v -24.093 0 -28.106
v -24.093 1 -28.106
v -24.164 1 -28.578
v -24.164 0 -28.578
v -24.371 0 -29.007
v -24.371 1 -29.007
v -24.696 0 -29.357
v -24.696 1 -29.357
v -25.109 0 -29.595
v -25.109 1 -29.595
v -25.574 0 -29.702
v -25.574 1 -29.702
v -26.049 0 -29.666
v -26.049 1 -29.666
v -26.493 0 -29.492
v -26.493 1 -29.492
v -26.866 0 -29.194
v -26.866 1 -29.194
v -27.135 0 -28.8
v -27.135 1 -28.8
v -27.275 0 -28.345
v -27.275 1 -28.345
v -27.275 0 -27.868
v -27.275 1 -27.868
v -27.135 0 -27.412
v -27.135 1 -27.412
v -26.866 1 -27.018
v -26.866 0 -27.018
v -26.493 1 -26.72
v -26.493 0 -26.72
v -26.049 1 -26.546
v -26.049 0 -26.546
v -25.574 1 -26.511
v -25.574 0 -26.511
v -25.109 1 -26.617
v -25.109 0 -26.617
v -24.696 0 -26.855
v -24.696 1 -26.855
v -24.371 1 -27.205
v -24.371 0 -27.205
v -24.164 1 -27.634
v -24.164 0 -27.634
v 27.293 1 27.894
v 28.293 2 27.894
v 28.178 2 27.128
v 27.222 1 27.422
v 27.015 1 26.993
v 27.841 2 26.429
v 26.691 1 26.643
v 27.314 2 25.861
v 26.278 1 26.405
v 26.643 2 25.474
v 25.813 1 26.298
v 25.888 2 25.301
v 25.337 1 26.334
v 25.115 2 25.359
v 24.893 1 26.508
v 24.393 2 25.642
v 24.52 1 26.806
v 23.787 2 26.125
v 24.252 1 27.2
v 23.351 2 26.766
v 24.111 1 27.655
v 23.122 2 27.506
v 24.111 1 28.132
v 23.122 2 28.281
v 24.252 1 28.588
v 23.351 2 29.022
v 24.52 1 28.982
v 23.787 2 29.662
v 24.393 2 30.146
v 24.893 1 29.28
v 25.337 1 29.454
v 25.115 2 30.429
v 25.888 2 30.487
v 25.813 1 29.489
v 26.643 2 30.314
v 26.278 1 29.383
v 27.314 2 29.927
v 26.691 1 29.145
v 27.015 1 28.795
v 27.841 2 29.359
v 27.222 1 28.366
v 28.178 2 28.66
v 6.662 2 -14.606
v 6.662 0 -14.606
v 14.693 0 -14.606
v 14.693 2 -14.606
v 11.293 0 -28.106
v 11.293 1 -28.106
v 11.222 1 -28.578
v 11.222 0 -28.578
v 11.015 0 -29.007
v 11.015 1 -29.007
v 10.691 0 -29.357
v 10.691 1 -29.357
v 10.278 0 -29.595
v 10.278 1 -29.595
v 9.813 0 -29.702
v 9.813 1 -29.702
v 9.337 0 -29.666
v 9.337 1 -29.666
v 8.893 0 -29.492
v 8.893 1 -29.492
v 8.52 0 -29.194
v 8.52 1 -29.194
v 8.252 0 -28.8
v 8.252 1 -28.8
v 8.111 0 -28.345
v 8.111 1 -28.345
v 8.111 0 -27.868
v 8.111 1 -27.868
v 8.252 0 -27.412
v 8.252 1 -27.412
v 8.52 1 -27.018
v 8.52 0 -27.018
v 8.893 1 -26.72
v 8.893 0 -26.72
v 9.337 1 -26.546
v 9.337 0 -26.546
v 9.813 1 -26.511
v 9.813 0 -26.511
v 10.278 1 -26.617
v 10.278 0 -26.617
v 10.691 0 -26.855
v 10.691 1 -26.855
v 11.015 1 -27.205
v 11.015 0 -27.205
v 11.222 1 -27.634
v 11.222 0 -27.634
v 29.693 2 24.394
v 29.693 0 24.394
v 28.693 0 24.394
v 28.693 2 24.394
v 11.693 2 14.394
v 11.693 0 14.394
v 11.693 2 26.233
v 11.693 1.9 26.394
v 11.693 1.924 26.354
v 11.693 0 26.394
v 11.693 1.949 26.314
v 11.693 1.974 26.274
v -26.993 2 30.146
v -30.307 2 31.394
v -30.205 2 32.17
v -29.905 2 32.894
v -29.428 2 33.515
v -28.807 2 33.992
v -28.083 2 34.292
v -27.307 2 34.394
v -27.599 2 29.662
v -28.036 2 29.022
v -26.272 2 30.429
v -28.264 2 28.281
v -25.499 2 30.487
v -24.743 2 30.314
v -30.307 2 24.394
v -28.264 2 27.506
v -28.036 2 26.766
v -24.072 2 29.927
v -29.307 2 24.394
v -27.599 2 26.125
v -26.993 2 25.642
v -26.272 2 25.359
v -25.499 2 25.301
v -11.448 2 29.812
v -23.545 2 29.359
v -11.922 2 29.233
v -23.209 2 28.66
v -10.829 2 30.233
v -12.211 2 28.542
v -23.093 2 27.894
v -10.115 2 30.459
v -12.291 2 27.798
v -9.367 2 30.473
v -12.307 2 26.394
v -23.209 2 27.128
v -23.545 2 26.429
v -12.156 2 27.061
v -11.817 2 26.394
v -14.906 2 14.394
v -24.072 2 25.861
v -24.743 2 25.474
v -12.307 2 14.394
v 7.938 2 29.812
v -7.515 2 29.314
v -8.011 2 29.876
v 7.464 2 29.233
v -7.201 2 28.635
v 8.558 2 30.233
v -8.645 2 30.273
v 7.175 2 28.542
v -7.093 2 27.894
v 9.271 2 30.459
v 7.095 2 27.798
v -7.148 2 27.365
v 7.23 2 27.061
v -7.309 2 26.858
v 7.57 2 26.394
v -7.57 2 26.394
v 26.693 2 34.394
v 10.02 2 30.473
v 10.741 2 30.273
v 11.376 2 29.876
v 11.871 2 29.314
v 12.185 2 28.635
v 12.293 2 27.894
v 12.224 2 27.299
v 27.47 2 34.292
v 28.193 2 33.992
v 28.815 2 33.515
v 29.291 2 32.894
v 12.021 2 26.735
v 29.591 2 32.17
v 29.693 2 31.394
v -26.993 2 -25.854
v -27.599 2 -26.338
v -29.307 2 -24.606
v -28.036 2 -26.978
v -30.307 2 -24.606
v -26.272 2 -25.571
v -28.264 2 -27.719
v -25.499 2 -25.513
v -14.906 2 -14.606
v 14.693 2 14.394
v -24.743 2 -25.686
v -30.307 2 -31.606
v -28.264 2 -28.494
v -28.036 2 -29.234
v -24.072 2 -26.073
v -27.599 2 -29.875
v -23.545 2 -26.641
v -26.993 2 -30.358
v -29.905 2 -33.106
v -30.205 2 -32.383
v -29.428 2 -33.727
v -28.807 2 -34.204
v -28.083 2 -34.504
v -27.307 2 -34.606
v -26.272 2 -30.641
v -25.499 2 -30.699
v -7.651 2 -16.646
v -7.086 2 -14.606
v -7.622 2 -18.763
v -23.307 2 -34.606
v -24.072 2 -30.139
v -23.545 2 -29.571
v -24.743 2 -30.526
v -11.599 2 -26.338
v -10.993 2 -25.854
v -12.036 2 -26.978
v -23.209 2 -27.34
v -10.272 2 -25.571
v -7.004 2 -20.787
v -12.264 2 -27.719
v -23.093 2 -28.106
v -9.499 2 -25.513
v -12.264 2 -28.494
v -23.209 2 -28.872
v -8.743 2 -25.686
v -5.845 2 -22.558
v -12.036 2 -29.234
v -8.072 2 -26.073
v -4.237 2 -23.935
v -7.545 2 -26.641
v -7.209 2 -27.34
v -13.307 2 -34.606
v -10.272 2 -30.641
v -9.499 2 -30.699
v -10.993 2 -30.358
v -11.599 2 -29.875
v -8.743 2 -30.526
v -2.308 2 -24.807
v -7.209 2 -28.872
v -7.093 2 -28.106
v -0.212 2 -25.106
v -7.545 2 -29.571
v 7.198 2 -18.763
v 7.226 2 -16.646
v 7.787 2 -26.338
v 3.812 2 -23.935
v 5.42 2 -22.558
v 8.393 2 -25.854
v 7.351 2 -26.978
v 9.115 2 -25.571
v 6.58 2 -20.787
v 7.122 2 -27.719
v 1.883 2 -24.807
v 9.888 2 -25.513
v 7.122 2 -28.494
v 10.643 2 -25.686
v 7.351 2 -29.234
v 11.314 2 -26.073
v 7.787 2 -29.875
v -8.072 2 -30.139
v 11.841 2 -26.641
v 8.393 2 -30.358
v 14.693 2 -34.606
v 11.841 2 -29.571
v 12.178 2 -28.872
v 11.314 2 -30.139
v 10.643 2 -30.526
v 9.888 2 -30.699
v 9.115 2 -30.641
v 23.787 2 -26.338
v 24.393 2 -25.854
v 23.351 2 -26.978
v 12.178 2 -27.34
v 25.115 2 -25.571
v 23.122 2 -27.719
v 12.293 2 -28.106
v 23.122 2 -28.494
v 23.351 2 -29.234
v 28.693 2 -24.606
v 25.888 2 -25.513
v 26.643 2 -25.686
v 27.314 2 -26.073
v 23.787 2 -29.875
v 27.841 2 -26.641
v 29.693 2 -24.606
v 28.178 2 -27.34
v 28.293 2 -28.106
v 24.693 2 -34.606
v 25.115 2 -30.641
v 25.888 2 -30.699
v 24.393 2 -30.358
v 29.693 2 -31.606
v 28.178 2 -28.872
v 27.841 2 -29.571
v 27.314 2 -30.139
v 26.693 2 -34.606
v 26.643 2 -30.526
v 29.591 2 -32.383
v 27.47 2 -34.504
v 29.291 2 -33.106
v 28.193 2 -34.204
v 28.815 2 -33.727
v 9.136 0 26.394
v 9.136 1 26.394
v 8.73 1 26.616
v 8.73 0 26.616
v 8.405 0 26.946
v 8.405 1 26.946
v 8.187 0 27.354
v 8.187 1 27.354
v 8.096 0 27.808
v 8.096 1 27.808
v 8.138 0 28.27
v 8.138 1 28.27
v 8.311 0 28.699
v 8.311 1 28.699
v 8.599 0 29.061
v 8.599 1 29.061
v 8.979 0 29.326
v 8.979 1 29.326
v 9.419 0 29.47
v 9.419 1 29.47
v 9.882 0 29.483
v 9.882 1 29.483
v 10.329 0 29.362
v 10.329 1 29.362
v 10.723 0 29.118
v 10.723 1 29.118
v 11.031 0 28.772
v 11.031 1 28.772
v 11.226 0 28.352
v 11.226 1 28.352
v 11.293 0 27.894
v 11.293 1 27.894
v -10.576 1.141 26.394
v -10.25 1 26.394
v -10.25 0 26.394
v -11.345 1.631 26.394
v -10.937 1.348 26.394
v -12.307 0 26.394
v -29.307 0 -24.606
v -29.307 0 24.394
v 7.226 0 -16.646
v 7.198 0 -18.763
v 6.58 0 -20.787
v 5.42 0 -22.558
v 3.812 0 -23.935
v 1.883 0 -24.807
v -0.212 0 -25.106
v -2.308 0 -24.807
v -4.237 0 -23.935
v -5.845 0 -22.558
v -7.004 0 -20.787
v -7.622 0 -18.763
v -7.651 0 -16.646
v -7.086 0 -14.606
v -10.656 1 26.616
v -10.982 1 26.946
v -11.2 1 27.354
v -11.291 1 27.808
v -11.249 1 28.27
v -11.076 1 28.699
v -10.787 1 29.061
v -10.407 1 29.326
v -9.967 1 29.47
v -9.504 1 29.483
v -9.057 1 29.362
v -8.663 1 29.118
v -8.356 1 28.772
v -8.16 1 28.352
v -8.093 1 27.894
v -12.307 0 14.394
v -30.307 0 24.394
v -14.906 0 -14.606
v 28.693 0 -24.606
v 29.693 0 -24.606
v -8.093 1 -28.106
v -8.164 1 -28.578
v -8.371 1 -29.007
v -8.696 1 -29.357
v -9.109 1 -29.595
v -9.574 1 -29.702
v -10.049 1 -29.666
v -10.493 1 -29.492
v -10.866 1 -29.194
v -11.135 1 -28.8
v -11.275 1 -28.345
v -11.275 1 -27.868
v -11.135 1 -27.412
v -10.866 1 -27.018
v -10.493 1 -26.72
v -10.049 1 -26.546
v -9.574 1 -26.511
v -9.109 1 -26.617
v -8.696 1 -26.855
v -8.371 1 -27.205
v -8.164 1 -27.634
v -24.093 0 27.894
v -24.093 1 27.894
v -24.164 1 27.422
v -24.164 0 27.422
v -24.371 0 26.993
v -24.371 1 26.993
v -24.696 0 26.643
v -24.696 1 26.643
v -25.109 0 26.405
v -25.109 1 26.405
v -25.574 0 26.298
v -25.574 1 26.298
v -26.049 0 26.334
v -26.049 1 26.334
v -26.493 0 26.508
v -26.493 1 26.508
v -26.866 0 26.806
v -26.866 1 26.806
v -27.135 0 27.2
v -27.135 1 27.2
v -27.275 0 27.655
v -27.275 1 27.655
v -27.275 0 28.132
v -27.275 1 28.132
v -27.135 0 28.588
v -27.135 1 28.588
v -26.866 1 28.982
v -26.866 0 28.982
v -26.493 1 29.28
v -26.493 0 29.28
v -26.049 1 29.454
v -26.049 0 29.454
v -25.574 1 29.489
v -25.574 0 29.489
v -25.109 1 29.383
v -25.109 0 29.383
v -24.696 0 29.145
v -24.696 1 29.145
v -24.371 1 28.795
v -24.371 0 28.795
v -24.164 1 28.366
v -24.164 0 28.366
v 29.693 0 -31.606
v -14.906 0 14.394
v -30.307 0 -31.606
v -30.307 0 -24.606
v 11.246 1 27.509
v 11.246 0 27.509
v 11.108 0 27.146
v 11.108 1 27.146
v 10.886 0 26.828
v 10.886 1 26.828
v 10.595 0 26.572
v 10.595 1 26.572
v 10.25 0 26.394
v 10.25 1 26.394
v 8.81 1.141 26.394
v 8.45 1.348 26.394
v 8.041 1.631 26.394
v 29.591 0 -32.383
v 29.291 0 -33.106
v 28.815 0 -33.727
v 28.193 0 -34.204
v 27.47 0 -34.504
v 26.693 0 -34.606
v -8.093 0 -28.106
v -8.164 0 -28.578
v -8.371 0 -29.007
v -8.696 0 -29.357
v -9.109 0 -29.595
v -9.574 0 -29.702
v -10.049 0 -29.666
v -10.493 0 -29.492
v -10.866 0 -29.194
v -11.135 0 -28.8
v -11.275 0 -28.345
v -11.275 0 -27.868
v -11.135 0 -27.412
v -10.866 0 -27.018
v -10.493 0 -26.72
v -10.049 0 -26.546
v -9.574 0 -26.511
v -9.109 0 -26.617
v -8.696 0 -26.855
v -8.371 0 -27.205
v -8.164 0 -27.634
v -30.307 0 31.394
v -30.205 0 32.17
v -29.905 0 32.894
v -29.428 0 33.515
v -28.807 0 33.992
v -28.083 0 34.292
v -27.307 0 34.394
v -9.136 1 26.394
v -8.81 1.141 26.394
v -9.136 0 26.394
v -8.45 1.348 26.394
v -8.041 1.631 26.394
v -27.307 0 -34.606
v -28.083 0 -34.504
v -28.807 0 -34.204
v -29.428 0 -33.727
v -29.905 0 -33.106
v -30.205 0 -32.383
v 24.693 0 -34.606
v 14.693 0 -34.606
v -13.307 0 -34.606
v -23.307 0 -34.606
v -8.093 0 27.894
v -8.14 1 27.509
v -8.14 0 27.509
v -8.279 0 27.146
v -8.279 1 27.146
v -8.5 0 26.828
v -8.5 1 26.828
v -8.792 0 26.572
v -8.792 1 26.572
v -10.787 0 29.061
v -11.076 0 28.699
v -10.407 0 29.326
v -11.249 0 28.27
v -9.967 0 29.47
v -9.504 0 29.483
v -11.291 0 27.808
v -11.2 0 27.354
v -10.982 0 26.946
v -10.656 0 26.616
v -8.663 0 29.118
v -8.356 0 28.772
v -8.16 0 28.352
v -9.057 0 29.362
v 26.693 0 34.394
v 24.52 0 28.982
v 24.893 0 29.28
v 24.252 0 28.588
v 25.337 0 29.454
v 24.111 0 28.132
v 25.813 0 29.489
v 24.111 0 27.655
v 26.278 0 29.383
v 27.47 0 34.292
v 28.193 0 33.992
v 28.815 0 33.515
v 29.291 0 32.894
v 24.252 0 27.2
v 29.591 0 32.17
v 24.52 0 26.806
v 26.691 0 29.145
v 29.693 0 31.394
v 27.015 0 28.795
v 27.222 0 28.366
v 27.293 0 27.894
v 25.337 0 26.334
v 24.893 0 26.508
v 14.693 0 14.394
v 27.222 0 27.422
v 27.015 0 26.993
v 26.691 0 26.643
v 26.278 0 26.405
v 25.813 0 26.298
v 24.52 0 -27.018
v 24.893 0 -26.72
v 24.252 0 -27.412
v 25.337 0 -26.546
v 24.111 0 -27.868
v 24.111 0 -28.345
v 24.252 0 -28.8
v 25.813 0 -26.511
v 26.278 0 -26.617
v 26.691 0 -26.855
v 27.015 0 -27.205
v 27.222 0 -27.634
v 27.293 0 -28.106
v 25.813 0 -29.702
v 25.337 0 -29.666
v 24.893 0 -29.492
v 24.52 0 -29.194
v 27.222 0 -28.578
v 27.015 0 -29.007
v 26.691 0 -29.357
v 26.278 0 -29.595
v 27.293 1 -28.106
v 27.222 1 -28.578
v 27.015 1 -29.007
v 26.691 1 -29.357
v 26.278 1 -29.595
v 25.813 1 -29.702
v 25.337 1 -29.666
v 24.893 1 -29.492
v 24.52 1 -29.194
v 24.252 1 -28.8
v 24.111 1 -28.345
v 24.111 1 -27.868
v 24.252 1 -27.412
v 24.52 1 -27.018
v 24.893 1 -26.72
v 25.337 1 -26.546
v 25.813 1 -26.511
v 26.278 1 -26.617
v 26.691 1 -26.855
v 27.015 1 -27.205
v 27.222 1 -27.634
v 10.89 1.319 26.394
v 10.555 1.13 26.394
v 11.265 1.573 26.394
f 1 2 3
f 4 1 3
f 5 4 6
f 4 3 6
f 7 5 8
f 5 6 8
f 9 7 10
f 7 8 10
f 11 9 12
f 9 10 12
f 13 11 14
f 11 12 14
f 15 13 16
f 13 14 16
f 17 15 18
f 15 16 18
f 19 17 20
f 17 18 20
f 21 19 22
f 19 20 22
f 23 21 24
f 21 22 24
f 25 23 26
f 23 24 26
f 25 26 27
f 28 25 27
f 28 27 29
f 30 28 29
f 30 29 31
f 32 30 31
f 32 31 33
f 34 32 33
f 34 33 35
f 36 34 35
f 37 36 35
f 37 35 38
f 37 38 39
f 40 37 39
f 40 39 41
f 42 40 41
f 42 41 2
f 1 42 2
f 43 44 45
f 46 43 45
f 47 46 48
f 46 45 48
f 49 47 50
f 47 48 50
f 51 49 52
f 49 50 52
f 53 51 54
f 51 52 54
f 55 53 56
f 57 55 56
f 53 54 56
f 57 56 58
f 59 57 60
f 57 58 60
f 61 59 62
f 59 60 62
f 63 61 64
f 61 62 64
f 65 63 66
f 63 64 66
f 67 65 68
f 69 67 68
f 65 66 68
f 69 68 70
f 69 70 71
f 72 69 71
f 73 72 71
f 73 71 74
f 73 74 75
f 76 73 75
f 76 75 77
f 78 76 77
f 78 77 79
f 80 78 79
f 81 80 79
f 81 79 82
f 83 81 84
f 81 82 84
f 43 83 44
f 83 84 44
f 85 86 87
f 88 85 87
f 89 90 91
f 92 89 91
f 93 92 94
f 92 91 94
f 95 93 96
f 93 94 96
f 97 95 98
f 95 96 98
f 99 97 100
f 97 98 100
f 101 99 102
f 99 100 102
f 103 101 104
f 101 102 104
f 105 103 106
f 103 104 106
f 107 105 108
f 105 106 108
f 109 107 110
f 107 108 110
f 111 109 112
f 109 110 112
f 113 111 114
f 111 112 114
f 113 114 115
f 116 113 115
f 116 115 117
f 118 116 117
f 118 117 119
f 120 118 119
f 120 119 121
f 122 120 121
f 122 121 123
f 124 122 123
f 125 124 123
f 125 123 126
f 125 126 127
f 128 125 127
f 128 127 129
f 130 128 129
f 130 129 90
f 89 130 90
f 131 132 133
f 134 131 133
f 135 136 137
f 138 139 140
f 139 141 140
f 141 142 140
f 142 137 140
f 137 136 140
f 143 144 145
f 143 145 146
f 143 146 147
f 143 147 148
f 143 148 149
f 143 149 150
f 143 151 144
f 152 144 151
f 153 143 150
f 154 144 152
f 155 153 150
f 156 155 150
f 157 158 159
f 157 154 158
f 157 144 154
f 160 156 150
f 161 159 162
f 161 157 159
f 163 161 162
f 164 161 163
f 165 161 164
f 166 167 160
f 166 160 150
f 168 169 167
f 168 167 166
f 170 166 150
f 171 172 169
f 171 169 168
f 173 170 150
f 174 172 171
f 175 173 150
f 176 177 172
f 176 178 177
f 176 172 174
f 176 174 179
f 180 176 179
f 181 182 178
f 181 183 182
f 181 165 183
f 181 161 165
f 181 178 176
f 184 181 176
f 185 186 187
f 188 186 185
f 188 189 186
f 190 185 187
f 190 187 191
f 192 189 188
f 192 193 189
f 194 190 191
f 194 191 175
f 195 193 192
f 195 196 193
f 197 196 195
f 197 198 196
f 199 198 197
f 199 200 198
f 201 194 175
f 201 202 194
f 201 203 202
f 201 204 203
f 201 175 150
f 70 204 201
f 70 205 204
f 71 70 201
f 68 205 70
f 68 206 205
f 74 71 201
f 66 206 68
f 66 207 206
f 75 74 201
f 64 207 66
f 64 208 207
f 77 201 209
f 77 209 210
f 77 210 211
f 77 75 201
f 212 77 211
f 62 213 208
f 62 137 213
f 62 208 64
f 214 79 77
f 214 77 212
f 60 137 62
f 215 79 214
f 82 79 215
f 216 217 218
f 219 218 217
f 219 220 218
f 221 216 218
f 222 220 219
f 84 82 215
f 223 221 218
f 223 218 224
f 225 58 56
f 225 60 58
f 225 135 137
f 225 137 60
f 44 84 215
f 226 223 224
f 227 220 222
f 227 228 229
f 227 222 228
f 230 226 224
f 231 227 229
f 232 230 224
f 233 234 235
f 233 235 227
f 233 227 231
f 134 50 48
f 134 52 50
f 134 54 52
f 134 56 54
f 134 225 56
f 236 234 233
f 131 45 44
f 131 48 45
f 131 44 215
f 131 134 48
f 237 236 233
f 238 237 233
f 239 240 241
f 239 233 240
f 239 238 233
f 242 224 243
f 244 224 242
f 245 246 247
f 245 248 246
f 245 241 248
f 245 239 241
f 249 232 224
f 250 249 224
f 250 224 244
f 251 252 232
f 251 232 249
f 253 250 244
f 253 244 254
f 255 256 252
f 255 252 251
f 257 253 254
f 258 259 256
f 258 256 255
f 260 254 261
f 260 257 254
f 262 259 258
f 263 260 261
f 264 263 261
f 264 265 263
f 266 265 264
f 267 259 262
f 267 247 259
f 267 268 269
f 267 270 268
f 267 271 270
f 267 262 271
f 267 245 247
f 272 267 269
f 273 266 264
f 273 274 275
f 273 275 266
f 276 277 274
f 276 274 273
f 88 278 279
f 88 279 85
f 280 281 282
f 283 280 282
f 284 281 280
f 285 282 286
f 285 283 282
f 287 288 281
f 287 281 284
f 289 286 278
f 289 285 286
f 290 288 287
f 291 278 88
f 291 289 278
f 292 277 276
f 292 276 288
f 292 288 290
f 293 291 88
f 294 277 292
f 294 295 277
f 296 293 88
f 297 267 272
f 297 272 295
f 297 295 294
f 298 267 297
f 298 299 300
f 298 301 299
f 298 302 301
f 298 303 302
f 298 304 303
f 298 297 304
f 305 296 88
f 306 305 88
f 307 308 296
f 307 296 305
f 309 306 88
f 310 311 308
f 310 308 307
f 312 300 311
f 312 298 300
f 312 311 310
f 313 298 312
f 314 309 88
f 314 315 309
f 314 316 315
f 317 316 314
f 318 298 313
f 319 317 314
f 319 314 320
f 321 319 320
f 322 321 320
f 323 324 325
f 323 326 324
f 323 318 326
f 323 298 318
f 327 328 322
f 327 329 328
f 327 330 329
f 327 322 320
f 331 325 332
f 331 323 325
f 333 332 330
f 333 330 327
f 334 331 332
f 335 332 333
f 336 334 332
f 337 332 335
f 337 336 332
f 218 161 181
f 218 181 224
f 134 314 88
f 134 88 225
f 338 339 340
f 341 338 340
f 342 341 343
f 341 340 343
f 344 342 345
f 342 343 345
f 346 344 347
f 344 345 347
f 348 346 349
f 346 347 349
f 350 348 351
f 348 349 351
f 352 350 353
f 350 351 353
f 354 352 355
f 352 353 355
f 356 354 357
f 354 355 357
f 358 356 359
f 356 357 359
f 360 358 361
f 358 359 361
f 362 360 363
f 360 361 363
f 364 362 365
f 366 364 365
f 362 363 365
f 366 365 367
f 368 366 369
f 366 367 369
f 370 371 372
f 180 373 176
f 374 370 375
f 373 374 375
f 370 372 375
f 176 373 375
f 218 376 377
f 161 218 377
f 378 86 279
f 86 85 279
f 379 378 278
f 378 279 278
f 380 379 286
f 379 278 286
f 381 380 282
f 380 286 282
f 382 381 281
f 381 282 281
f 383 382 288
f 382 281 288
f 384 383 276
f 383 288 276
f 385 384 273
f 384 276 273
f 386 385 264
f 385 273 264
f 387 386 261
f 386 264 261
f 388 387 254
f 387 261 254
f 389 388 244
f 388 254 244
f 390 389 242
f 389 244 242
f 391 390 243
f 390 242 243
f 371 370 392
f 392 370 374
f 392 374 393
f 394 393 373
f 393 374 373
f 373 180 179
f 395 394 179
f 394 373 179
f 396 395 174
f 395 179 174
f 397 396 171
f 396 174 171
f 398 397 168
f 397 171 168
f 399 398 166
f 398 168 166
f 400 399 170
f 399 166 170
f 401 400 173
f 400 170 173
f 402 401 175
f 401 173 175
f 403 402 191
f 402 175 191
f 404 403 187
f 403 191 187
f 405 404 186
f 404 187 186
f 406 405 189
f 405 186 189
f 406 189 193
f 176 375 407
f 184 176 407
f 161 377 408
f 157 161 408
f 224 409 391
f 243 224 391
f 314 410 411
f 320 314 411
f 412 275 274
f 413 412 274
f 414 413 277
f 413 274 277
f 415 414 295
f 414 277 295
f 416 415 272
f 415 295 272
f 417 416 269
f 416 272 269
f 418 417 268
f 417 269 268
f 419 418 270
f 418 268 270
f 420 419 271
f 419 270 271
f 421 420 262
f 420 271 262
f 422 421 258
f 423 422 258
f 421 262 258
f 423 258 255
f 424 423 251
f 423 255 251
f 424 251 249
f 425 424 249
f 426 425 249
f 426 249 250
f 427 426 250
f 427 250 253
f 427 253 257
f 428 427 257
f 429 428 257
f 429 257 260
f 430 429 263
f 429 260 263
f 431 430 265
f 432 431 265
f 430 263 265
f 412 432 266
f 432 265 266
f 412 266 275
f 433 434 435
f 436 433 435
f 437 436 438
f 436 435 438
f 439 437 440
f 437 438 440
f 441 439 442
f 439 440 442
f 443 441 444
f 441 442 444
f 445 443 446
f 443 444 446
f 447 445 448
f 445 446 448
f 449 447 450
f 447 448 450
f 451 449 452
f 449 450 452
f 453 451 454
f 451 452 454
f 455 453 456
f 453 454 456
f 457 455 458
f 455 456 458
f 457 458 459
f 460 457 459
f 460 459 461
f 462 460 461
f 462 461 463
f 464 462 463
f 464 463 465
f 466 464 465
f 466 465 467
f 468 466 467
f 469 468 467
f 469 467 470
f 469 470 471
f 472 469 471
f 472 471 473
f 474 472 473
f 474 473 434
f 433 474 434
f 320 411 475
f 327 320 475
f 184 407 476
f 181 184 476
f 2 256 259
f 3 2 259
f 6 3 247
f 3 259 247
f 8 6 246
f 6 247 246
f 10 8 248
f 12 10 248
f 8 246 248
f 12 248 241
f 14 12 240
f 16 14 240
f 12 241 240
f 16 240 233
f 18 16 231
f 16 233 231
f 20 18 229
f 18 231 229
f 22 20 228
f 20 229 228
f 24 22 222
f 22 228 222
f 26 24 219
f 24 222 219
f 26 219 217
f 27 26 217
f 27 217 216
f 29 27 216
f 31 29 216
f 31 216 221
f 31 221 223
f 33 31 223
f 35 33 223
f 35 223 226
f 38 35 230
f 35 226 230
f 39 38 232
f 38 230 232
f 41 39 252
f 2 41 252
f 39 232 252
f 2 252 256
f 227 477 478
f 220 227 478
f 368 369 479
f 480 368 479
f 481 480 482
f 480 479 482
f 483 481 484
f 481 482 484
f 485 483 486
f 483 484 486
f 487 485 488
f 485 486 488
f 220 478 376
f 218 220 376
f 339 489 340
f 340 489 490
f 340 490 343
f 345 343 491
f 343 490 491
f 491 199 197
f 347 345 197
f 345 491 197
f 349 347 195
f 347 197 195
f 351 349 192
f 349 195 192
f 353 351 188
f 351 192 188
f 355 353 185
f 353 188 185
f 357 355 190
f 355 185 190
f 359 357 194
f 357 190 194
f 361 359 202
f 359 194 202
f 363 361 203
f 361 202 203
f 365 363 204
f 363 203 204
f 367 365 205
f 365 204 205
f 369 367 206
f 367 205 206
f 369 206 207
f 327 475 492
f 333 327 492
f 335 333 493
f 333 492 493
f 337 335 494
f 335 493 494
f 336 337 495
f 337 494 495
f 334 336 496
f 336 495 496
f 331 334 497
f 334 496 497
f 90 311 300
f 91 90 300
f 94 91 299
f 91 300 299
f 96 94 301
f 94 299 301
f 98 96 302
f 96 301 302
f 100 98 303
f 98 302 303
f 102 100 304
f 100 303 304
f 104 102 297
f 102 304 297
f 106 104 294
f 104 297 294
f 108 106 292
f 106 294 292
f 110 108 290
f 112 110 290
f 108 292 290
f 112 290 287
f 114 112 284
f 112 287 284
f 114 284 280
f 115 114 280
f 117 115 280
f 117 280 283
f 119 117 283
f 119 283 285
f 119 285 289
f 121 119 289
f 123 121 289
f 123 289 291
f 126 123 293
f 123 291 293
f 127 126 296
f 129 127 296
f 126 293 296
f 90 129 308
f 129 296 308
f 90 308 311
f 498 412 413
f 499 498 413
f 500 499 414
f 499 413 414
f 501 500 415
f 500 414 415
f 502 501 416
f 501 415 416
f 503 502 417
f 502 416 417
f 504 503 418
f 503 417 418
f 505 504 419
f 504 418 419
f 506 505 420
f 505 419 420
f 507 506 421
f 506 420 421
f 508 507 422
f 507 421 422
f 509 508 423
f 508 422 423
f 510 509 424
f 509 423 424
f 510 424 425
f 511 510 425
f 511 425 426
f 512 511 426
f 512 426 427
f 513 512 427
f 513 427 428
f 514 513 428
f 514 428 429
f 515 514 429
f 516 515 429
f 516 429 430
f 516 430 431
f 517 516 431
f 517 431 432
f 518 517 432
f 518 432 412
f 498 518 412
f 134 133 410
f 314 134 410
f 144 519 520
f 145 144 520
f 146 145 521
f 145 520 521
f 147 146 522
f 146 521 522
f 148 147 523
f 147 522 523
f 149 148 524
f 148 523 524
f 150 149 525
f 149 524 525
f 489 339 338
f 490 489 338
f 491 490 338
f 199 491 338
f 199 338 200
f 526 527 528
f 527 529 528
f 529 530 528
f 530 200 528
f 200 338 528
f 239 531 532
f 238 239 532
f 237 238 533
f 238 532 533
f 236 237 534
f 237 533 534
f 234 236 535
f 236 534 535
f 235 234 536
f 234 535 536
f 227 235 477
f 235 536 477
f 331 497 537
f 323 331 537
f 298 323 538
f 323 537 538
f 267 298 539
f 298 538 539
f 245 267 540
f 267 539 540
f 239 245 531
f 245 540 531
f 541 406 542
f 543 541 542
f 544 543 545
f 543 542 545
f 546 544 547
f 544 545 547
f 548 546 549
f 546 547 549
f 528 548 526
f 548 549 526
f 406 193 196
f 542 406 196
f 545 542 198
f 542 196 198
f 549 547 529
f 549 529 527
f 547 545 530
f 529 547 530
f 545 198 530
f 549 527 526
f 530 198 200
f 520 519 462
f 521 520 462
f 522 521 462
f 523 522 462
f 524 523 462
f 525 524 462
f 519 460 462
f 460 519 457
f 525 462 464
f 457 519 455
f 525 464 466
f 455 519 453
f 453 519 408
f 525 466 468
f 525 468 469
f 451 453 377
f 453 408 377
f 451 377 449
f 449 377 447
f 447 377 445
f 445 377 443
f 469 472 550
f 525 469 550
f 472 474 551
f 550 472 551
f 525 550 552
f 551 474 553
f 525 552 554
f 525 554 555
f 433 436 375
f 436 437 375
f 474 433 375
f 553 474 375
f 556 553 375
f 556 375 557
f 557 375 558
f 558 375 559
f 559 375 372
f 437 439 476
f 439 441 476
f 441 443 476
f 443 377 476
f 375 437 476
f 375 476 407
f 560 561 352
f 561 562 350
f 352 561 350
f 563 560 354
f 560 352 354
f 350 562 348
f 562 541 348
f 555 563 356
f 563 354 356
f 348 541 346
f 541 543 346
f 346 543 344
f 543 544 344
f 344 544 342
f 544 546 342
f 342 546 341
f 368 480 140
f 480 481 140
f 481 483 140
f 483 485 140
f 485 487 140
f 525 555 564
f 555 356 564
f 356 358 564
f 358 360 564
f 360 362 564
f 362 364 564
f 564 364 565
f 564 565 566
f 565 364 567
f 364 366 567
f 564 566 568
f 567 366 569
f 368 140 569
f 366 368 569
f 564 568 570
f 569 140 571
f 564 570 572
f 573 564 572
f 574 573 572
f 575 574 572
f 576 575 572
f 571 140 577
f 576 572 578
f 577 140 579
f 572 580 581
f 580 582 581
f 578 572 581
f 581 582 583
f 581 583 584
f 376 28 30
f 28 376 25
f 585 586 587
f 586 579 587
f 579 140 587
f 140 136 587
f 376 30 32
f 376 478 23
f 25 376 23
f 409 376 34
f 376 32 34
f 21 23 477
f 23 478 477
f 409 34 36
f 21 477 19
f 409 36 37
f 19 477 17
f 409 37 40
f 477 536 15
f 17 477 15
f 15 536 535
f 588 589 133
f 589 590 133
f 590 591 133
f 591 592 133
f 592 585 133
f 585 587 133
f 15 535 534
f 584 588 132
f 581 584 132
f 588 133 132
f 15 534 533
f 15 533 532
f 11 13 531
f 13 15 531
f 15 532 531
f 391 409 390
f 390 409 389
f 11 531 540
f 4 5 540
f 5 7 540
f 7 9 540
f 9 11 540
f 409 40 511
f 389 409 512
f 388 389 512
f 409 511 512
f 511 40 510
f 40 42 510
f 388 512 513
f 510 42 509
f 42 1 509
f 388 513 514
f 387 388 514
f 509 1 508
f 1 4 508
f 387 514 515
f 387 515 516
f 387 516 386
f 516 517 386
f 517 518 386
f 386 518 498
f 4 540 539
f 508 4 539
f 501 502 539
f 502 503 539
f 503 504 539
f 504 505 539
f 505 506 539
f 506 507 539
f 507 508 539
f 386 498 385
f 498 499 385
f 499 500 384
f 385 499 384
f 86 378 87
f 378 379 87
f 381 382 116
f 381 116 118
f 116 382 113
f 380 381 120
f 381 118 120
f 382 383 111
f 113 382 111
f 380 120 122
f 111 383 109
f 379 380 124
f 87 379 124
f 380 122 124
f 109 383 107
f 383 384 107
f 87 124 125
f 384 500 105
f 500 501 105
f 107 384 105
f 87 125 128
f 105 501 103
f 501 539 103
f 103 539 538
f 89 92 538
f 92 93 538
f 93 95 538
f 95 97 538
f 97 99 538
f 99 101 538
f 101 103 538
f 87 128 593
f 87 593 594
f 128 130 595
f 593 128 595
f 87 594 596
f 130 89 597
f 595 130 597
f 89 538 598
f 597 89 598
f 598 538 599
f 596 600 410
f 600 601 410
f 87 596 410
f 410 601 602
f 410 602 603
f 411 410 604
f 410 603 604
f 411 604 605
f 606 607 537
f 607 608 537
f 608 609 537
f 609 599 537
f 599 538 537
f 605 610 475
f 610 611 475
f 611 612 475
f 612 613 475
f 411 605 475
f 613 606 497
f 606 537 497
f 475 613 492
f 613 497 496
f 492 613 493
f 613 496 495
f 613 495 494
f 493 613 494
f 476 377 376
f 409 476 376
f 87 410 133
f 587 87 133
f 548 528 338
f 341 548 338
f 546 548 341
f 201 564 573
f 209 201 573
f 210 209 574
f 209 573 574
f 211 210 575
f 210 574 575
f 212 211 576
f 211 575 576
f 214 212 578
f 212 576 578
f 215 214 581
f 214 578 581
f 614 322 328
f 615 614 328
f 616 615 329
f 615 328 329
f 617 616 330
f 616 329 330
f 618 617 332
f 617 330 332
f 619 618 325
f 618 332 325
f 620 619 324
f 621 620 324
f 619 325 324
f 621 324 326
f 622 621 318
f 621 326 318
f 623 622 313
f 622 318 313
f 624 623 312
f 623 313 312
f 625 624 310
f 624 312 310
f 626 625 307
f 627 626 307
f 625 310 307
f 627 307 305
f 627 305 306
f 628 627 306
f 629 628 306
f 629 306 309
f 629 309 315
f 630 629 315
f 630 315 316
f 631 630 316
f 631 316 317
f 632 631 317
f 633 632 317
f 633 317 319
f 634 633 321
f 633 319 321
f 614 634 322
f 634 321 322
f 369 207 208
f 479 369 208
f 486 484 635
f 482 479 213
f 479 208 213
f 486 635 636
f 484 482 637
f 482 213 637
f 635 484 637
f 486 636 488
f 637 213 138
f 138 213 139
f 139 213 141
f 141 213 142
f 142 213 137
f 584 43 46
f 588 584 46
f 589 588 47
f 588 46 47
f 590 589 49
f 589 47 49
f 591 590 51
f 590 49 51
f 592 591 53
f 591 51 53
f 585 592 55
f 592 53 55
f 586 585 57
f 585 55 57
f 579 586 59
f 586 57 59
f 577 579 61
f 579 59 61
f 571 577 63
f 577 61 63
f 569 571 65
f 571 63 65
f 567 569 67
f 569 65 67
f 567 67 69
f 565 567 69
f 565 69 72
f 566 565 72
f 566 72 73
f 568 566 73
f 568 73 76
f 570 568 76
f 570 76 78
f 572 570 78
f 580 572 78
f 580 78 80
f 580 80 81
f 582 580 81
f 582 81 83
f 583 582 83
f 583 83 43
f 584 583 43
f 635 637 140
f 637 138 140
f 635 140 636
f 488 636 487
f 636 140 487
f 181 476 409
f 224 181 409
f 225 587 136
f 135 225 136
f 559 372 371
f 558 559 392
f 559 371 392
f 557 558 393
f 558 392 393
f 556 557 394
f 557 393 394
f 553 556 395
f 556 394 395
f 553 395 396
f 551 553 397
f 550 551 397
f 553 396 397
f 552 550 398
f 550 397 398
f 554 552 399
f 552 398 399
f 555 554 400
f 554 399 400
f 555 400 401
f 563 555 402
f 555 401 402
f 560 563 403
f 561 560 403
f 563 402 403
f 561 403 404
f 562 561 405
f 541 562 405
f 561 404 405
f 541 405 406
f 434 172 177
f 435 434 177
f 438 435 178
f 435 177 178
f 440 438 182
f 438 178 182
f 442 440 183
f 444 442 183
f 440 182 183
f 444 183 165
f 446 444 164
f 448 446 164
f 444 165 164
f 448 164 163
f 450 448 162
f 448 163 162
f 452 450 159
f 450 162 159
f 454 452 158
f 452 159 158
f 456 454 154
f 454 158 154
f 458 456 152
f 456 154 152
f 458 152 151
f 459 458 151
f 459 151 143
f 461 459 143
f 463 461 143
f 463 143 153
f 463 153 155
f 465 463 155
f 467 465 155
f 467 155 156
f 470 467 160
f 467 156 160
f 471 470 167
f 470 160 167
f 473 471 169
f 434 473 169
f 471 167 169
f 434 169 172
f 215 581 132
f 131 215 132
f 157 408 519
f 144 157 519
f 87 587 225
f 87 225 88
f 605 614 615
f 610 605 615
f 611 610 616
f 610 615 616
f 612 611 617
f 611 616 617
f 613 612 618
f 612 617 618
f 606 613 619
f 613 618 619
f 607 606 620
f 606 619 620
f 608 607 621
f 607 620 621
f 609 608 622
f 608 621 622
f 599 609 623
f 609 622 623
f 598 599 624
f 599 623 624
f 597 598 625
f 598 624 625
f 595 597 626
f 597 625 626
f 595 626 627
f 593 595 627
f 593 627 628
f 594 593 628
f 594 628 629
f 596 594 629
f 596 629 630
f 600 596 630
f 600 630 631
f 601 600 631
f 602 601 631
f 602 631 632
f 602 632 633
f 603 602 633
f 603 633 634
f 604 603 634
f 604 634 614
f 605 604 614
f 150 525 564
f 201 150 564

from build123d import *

# Parameters (mm, degrees)
SKETCH1_W           = 14.40065461
SKETCH1_H           = 29
SKETCH1_W_2         = 14
SKETCH1_R           = 1.35
BOSS_EXTRUDE2_DEPTH = 2
SKETCH2_R           = 7.5
CUT_EXTRUDE1_DEPTH  = 2
SKETCH3_W           = 5.497638463
SKETCH3_H           = 5.570940309
SKETCH3_W_2         = 9.162730771
SKETCH3_H_2         = 3.811696001
SKETCH3_W_3         = 6.450562463
SKETCH3_H_3         = 6.157355078
SKETCH3_W_4         = 5.570940309
SKETCH3_H_4         = 4.544714463
SKETCH3_W_5         = 6.27821864
SKETCH3_H_5         = 3.656250045
SKETCH3_W_6         = 6.338006476
SKETCH3_H_6         = 4.174139377
BOSS_EXTRUDE3_DEPTH = 2
SKETCH4_R           = 1.6
CUT_EXTRUDE2_DEPTH  = 10
CHAMFER1_SIZE       = 1
SKETCH5_W           = 10.813263603
SKETCH5_H           = 2.270321327
SKETCH5_W_2         = 10.386812418
SKETCH5_H_2         = 2.583327919
SKETCH5_W_3         = 10.884553744
SKETCH5_H_3         = 2.62287776
SKETCH5_W_4         = 12.051602383
SKETCH5_H_4         = 3.322696714
BOSS_EXTRUDE4_DEPTH = 2


with BuildPart() as part:
    # Sketch1 → Boss-Extrude2 (new body)
    with BuildSketch(Plane(origin=(0, 0, 0), x_dir=(1, 0, 0), z_dir=(0, 1, 0))):
        with Locations((-22.106428168, 0.106069008)):
            Rectangle(SKETCH1_W, SKETCH1_H)
        with Locations((21.693244527, 0.106069008)):
            Rectangle(SKETCH1_W_2, SKETCH1_H)
        with BuildLine():
            Line((22.693244527, -34.393930992), (26.693244527, -34.393930992))
            ThreePointArc((26.693244527, -34.393930992), (28.814564871, -33.515251336), (29.693244527, -31.393930992))
            Line((29.693244527, -31.393930992), (29.693244527, -24.393930992))
            Line((29.693244527, -24.393930992), (28.693244527, -24.393930992))
            Line((28.693244527, -24.393930992), (28.693244527, -14.393930992))
            Line((28.693244527, -14.393930992), (11.693244527, -14.393930992))
            Line((11.693244527, -14.393930992), (11.693244527, -26.393930992))
            Line((11.693244527, -26.393930992), (-12.306755473, -26.393930992))
            Line((-12.306755473, -26.393930992), (-12.306755473, -14.393930992))
            Line((-12.306755473, -14.393930992), (-29.306755473, -14.393930992))
            Line((-29.306755473, -14.393930992), (-29.306755473, -24.393930992))
            Line((-29.306755473, -24.393930992), (-30.306755473, -24.393930992))
            Line((-30.306755473, -24.393930992), (-30.306755473, -31.393930992))
            ThreePointArc((-30.306755473, -31.393930992), (-29.428075817, -33.515251336), (-27.306755473, -34.393930992))
            Line((-27.306755473, -34.393930992), (-25.306755473, -34.393930992))
            Line((-25.306755473, -34.393930992), (-25.306755473, -32.393930992))
            Line((-25.306755473, -32.393930992), (-15.306755473, -32.393930992))
            Line((-15.306755473, -32.393930992), (-15.306755473, -34.393930992))
            Line((-15.306755473, -34.393930992), (12.693244527, -34.393930992))
            Line((12.693244527, -34.393930992), (12.693244527, -32.393930992))
            Line((12.693244527, -32.393930992), (22.693244527, -32.393930992))
            Line((22.693244527, -32.393930992), (22.693244527, -34.393930992))
        make_face()
        with Locations((-20.98250428, -22.393930992)):
            Circle(SKETCH1_R, mode=Mode.SUBTRACT)
        with Locations((19.975772563, -22.393930992)):
            Circle(SKETCH1_R, mode=Mode.SUBTRACT)
        with Locations((-0.212217338, -28.393930992)):
            Circle(SKETCH1_R, mode=Mode.SUBTRACT)
        with BuildLine():
            Line((-23.306755473, 34.606069008), (-27.306755473, 34.606069008))
            ThreePointArc((-27.306755473, 34.606069008), (-29.428075817, 33.727389352), (-30.306755473, 31.606069008))
            Line((-30.306755473, 31.606069008), (-30.306755473, 24.606069008))
            Line((-30.306755473, 24.606069008), (-29.306755473, 24.606069008))
            Line((-29.306755473, 24.606069008), (-29.306755473, 14.606069008))
            Line((-29.306755473, 14.606069008), (28.693244527, 14.606069008))
            Line((28.693244527, 14.606069008), (28.693244527, 24.606069008))
            Line((28.693244527, 24.606069008), (29.693244527, 24.606069008))
            Line((29.693244527, 24.606069008), (29.693244527, 31.606069008))
            ThreePointArc((29.693244527, 31.606069008), (28.814564871, 33.727389352), (26.693244527, 34.606069008))
            Line((26.693244527, 34.606069008), (24.693244527, 34.606069008))
            Line((24.693244527, 34.606069008), (24.693244527, 32.606069008))
            Line((24.693244527, 32.606069008), (14.693244527, 32.606069008))
            Line((14.693244527, 32.606069008), (14.693244527, 34.606069008))
            Line((14.693244527, 34.606069008), (-13.306755473, 34.606069008))
            Line((-13.306755473, 34.606069008), (-13.306755473, 32.606069008))
            Line((-13.306755473, 32.606069008), (-23.306755473, 32.606069008))
            Line((-23.306755473, 32.606069008), (-23.306755473, 34.606069008))
        make_face()
        with Locations((-20.98250428, 22.606069008)):
            Circle(SKETCH1_R, mode=Mode.SUBTRACT)
        with Locations((-0.212217338, 28.606069008)):
            Circle(SKETCH1_R, mode=Mode.SUBTRACT)
        with Locations((19.975772563, 22.606069008)):
            Circle(SKETCH1_R, mode=Mode.SUBTRACT)
        with Locations((-0.212217338, 17.606069008)):
            Circle(SKETCH1_R, mode=Mode.SUBTRACT)
    extrude(amount=BOSS_EXTRUDE2_DEPTH)

    # Sketch2 → Cut-Extrude1 (cut)
    with BuildSketch(Plane(origin=(0, 2, 0), x_dir=(1, 0, 0), z_dir=(0, 1, 0))):
        with Locations((-0.212217338, 17.606069008)):
            Circle(SKETCH2_R)
    extrude(amount=-CUT_EXTRUDE1_DEPTH, mode=Mode.SUBTRACT)

    # Sketch3 → Boss-Extrude3 (add)
    with BuildSketch(Plane(origin=(0, 2, 0), x_dir=(1, 0, 0), z_dir=(0, 1, 0))):
        with Locations((-20.684668709, 22.829641321)):
            Rectangle(SKETCH3_W, SKETCH3_H)
        with Locations((0.426262988, 28.40058163)):
            Rectangle(SKETCH3_W_2, SKETCH3_H_2)
        with Locations((19.594695763, 21.950019167)):
            Rectangle(SKETCH3_W_3, SKETCH3_H_3)
        with Locations((20.03450684, -21.664579305)):
            Rectangle(SKETCH3_W_4, SKETCH3_H_4)
        with Locations((-1.015993077, -28.583465841)):
            Rectangle(SKETCH3_W_5, SKETCH3_H_5)
        with Locations((-20.264484702, -22.364159865)):
            Rectangle(SKETCH3_W_6, SKETCH3_H_6)
    extrude(amount=-BOSS_EXTRUDE3_DEPTH)

    # Sketch4 → Cut-Extrude2 (cut)
    with BuildSketch(Plane(origin=(0, 2, 0), x_dir=(1, 0, 0), z_dir=(0, 1, 0))):
        with BuildLine():
            ThreePointArc((-8.093244527, -27.893930992), (-8.379691654, -26.980378119), (-9.136468091, -26.393930992))
            Line((-9.136468091, -26.393930992), (-10.250020963, -26.393930992))
            ThreePointArc((-10.250020963, -26.393930992), (-10.6067974, -29.207483865), (-8.093244527, -27.893930992))
        make_face()
        with BuildLine():
            Line((-10.250020963, -26.393930992), (-9.136468091, -26.393930992))
            ThreePointArc((-9.136468091, -26.393930992), (-9.693244527, -26.293930992), (-10.250020963, -26.393930992))
        make_face()
        with Locations((-25.693244527, -27.893930992)):
            Circle(SKETCH4_R)
        with BuildLine():
            ThreePointArc((9.136468091, -26.393930992), (8.779691654, -29.207483865), (11.293244527, -27.893930992))
            ThreePointArc((11.293244527, -27.893930992), (11.0067974, -26.980378119), (10.250020963, -26.393930992))
            Line((10.250020963, -26.393930992), (9.136468091, -26.393930992))
        make_face()
        with BuildLine():
            Line((9.136468091, -26.393930992), (10.250020963, -26.393930992))
            ThreePointArc((10.250020963, -26.393930992), (9.693244527, -26.293930992), (9.136468091, -26.393930992))
        make_face()
        with Locations((25.693244527, -27.893930992)):
            Circle(SKETCH4_R)
        with Locations((25.693244527, 28.106069008)):
            Circle(SKETCH4_R)
        with Locations((9.693244527, 28.106069008)):
            Circle(SKETCH4_R)
        with Locations((-9.693244527, 28.106069008)):
            Circle(SKETCH4_R)
        with Locations((-25.693244527, 28.106069008)):
            Circle(SKETCH4_R)
    extrude(amount=-CUT_EXTRUDE2_DEPTH, mode=Mode.SUBTRACT)

    # Chamfer1
    chamfer1_edges = [part.edges().sort_by_distance(p)[0] for p in [
        (-27.293244527, 2, 27.893930992),
        (8.779691654, 2, 29.207483865),
        (24.093244527, 2, 27.893930992),
        (24.093244527, 2, -28.106069008),
        (8.093244527, 2, -28.106069008),
        (-11.293244527, 2, -28.106069008),
        (-27.293244527, 2, -28.106069008),
        (-10.6067974, 2, 29.207483865),
    ]]
    chamfer(chamfer1_edges, length=CHAMFER1_SIZE)

    # Sketch5 → Boss-Extrude4 (add)
    with BuildSketch(Plane(origin=(0, 2, 0), x_dir=(1, 0, 0), z_dir=(0, 1, 0))):
        with Locations((20.099876329, 33.470908345)):
            Rectangle(SKETCH5_W, SKETCH5_H)
        with Locations((-18.113349264, 33.314405048)):
            Rectangle(SKETCH5_W_2, SKETCH5_H_2)
        with Locations((-20.749032345, -33.082492112)):
            Rectangle(SKETCH5_W_3, SKETCH5_H_3)
        with Locations((16.667443335, -32.732582635)):
            Rectangle(SKETCH5_W_4, SKETCH5_H_4)
    extrude(amount=-BOSS_EXTRUDE4_DEPTH)


solid = part.part
